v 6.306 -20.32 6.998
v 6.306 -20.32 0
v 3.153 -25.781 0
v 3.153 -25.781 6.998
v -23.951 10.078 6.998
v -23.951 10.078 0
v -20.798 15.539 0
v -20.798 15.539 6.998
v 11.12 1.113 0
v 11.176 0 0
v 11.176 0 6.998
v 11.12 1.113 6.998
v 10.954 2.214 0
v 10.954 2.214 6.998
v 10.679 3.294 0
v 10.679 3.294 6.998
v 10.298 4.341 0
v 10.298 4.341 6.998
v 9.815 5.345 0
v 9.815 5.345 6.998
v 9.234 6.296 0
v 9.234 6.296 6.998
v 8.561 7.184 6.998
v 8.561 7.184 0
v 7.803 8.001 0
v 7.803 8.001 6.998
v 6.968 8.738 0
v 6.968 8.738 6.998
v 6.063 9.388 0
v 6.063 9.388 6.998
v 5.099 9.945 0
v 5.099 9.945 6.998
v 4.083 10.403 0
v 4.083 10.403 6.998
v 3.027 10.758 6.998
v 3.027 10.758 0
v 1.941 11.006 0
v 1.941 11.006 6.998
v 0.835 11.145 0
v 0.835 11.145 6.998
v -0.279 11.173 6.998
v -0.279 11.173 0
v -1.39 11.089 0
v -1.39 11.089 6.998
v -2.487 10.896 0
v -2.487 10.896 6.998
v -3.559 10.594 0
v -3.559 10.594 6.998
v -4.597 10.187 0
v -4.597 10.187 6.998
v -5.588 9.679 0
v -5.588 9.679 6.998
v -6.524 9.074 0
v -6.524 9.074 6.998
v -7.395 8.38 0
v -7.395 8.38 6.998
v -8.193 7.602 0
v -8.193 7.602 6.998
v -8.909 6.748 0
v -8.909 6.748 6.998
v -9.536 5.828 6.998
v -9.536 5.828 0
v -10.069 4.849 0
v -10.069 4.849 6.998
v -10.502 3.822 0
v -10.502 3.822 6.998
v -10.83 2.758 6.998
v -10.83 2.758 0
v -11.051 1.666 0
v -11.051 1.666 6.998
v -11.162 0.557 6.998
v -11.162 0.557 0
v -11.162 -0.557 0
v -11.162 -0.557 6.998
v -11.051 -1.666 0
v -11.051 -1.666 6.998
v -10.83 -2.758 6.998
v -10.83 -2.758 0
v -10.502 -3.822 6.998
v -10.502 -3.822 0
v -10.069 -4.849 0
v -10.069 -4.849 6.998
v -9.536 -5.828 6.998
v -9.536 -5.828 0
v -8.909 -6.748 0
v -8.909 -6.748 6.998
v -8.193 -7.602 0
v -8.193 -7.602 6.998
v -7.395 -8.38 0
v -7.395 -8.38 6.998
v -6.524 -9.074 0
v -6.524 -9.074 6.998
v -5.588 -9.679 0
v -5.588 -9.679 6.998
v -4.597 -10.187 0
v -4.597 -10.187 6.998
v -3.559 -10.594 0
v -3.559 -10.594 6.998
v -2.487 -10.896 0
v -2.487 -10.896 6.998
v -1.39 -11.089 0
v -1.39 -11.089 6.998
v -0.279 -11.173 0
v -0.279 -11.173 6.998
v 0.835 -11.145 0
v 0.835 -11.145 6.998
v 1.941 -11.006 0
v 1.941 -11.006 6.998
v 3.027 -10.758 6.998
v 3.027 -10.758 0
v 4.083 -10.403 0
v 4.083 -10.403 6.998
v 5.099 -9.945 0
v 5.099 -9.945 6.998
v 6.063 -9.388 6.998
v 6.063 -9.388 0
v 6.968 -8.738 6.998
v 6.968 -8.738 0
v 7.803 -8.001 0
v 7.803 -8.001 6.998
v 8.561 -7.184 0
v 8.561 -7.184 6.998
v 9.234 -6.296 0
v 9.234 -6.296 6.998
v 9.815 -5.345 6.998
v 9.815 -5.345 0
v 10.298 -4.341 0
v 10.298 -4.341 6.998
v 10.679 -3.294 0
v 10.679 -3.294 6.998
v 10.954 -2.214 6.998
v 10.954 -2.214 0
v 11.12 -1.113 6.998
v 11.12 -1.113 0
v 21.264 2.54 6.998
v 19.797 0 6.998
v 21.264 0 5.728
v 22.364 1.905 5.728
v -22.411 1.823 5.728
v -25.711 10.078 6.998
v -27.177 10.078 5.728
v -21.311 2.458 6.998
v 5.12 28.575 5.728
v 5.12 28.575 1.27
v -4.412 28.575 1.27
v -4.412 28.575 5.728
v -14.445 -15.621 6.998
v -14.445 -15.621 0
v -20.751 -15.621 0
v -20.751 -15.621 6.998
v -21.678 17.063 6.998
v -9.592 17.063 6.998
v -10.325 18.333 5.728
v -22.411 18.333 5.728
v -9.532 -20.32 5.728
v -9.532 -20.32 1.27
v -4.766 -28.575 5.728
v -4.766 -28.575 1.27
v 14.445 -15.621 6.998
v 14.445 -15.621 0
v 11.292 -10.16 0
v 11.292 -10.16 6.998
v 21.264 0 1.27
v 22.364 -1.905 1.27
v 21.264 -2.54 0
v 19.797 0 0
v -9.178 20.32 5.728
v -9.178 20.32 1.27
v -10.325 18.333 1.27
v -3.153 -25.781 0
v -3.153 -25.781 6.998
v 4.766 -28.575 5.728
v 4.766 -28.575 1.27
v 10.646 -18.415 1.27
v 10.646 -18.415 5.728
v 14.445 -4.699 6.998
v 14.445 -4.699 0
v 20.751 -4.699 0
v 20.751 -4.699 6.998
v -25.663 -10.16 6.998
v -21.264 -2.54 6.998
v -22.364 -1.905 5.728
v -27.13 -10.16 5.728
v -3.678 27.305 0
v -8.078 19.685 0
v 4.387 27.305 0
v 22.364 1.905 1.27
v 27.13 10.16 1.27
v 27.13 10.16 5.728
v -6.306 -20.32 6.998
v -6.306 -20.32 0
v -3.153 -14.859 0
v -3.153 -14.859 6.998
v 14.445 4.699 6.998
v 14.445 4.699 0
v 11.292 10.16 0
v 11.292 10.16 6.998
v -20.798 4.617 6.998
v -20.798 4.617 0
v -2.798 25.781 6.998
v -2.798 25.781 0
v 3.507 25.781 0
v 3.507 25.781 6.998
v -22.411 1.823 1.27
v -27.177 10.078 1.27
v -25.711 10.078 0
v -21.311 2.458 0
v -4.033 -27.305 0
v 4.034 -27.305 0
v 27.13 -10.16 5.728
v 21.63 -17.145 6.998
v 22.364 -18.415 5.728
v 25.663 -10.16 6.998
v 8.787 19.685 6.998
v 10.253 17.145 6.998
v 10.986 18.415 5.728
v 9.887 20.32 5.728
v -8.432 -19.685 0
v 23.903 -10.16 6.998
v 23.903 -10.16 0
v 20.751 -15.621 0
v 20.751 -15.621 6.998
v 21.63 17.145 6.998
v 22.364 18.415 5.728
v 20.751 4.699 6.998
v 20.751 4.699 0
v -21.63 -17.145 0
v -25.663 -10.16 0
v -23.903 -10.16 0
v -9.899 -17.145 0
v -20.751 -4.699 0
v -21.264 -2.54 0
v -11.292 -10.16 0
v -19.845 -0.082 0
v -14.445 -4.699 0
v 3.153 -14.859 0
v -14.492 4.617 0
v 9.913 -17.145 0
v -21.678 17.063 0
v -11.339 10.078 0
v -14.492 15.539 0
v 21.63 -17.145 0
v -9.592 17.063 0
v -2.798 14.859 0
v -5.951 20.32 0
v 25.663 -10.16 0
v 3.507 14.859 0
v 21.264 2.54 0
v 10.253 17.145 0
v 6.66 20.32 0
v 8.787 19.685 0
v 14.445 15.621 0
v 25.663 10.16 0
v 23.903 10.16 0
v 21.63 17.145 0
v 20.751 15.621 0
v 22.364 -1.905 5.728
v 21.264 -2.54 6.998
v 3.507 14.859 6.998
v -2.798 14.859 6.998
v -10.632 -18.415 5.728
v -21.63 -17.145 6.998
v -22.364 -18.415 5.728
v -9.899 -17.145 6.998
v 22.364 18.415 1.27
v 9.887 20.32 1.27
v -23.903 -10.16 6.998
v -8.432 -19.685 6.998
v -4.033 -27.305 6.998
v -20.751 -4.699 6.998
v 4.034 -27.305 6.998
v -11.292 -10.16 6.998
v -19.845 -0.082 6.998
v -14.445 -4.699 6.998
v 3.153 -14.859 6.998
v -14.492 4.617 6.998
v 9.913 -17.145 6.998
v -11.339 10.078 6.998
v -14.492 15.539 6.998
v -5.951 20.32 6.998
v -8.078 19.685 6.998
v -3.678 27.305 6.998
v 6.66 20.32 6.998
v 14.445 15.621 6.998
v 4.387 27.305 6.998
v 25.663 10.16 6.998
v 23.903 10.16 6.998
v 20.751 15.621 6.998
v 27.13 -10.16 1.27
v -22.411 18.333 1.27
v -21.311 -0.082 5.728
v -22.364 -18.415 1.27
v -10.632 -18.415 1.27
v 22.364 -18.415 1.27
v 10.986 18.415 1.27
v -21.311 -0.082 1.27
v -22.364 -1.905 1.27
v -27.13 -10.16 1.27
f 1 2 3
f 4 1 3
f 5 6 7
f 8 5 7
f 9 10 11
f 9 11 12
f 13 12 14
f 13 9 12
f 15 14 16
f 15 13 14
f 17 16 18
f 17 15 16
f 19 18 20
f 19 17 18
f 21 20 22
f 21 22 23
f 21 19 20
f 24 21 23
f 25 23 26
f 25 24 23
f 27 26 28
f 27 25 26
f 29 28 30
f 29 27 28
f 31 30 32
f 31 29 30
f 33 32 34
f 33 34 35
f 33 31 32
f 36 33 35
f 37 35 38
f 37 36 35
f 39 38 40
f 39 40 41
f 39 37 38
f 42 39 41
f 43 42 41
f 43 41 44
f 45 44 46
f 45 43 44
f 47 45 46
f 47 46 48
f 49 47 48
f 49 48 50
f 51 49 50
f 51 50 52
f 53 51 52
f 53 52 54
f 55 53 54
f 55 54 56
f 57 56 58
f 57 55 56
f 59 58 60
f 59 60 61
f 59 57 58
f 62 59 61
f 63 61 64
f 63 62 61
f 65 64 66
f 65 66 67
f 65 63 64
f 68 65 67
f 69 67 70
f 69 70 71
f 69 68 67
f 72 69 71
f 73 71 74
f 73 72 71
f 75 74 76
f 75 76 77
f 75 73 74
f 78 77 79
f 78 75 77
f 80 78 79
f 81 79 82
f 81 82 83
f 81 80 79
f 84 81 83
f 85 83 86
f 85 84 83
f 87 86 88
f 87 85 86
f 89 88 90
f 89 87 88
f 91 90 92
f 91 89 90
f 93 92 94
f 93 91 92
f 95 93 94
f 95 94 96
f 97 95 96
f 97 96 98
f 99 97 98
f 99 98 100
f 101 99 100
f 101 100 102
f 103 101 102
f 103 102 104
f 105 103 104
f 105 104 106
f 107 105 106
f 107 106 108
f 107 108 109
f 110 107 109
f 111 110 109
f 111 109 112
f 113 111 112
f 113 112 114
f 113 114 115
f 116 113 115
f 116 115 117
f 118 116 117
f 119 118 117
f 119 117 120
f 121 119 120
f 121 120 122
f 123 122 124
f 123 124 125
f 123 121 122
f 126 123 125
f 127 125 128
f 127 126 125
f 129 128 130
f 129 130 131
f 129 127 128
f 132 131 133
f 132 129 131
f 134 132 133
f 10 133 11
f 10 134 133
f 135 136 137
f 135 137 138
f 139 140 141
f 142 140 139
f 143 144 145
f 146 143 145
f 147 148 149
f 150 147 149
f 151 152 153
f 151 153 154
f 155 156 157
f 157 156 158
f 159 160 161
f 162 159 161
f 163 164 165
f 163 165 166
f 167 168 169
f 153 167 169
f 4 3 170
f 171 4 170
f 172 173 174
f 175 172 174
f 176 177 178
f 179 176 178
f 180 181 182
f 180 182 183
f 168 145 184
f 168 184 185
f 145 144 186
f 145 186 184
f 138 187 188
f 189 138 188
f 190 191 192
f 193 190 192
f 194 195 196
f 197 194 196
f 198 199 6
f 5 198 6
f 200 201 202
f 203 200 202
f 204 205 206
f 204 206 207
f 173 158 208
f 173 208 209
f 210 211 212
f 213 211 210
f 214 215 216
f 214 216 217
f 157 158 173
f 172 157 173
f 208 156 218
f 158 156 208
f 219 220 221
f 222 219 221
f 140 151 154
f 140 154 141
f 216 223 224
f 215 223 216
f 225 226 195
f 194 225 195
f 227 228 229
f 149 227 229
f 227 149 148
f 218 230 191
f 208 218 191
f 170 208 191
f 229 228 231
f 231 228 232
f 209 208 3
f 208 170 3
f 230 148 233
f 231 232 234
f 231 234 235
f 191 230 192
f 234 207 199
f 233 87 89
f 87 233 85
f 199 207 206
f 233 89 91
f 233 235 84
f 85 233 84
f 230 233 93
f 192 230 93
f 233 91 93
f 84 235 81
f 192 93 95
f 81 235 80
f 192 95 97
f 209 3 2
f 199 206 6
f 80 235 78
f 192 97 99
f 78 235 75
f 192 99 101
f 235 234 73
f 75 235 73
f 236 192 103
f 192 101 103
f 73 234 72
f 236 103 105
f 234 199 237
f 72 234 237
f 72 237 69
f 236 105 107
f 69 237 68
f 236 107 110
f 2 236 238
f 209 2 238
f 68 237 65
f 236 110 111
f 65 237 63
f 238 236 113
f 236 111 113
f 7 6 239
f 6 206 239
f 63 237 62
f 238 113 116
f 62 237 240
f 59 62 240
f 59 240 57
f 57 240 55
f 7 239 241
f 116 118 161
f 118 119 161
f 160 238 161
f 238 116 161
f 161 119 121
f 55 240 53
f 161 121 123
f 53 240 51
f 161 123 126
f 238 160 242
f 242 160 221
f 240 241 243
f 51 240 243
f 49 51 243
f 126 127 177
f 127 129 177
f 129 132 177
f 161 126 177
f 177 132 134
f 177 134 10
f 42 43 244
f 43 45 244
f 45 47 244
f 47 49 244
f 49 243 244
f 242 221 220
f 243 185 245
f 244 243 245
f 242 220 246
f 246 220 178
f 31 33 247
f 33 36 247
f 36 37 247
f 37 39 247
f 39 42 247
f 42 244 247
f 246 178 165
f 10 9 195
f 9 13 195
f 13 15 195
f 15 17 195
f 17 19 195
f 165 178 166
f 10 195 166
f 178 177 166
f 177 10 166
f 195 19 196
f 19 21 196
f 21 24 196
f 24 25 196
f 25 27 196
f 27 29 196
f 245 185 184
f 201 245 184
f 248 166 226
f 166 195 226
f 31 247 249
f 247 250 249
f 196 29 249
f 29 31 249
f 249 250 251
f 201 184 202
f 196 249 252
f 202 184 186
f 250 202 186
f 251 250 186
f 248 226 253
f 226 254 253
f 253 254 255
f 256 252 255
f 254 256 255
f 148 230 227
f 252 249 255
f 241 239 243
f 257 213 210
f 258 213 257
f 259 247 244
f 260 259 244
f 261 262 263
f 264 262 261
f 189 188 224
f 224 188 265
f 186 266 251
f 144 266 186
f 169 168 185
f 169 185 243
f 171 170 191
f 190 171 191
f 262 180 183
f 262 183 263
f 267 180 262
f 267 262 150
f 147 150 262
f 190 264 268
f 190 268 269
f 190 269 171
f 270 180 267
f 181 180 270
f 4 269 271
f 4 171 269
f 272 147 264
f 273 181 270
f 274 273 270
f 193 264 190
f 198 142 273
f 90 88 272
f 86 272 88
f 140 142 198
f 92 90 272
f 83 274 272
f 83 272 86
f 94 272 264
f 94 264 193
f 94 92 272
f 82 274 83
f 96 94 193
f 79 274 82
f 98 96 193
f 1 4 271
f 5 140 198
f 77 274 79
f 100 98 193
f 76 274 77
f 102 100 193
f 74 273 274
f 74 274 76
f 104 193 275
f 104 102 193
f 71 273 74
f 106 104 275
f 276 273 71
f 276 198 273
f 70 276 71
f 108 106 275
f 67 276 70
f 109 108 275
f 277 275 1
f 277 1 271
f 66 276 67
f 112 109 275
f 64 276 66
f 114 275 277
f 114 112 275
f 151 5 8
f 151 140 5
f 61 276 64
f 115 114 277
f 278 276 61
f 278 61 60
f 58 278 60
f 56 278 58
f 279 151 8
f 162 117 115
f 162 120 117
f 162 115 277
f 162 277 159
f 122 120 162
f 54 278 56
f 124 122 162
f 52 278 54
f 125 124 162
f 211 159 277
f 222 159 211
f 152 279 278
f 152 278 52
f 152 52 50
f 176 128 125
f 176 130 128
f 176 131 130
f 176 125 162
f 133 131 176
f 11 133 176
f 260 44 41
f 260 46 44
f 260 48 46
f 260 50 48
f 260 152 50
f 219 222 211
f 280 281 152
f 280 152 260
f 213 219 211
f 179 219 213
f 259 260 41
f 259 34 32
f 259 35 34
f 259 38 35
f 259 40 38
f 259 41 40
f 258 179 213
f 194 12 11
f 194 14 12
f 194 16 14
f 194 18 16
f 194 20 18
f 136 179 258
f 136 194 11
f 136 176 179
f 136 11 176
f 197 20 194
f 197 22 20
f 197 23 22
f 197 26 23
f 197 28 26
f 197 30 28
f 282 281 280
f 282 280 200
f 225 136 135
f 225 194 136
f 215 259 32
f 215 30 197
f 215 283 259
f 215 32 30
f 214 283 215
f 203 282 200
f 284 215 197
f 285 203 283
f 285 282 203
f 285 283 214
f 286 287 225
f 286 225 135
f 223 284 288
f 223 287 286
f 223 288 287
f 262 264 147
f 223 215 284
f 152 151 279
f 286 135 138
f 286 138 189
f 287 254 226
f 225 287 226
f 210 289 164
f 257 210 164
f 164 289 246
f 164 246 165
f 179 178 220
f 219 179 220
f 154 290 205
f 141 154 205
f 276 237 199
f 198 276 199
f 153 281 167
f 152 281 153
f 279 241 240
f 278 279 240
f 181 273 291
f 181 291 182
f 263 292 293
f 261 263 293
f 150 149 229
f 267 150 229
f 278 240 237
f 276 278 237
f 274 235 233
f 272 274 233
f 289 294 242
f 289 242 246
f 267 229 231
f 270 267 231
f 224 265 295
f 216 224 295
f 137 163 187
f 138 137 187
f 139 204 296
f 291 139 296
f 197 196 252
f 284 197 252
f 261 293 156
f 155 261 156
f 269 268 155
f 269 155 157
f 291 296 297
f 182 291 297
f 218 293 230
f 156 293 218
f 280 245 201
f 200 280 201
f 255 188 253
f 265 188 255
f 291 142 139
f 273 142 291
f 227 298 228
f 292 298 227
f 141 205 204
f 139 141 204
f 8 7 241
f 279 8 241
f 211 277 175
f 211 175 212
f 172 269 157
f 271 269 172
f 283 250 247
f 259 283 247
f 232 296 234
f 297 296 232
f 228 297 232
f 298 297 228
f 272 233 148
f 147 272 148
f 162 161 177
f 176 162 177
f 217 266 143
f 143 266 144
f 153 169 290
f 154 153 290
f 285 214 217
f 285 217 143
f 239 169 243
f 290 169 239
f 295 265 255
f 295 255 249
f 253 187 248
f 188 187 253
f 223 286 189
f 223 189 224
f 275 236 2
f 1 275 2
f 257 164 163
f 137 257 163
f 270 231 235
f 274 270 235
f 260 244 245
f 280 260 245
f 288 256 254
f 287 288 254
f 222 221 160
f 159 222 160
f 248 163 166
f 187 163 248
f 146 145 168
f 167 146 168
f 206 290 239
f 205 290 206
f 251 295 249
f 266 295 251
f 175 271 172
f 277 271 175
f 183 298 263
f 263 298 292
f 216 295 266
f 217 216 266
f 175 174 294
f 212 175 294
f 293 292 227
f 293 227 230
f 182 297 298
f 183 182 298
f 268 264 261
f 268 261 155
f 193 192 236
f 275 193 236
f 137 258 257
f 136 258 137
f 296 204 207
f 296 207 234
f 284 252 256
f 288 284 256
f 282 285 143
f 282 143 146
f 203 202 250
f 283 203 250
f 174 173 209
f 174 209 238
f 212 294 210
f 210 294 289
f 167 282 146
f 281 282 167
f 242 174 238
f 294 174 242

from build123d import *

# Parameters (mm, degrees)
F1_DEPTH = 6.9977
F2_R     = 11.176
F3_DEPTH = 6.9977
F4_SIZE  = 1.27


# Not quite as in the source:
# - a feature names something its author has since deleted; it is built from what else it names


with BuildPart() as f1:
    # F0 (on Top) → F1 (new body)
    with BuildSketch(Plane.XY):
        Polygon((-1.27, 12.7), (1.27, 12.7), (5.4871048633, 12.7), (6.9125849394, 15.169003917), (7.0907659214, 15.4776224307), (9.8865139145, 20.32), (5.1204874424, 28.575), (-4.411565502, 28.575), (-9.1775919741, 20.32), (-4.7781829229, 12.7), align=None)
        Polygon((6.6602806103, 20.32), (3.5073707902, 14.859), (-2.7984488498, 14.859), (-5.9513586699, 20.32), (-2.7984488498, 25.781), (3.5073707902, 25.781), align=None, mode=Mode.SUBTRACT)
        Polygon((6.9125849394, 15.169003917), (5.4871048633, 12.7), (7.3323484187, 12.7), (8.4322006815, 10.795), (12.8316097327, 18.415), (10.9863661773, 18.415), (9.8865139145, 20.32), (7.0907659214, 15.4776224307), align=None)
        Polygon((-7.3323484187, 12.7), (-4.7781829229, 12.7), (-9.1775919741, 20.32), (-10.3250266623, 18.3325848218), (-12.8789355329, 18.3325848218), (-8.4796547943, 10.7128070657), align=None)
        Polygon((12.8316097327, 18.415), (8.4322006815, 10.795), (11.6335226281, 5.2501477372), (13.5648445746, 1.905), (16.3276362049, 1.905), (18.8676362049, 1.905), (22.3636626771, 1.905), (27.1296891492, 10.16), (22.3636626771, 18.415), align=None)
        Polygon((20.7505460249, 4.699), (14.4447263849, 4.699), (11.2918165648, 10.16), (14.4447263849, 15.621), (20.7505460249, 15.621), (23.903455845, 10.16), align=None, mode=Mode.SUBTRACT)
        Polygon((-9.8614826635, 8.3194109889), (-8.4796547943, 10.7128070657), (-12.8789355329, 18.3325848218), (-22.4109884772, 18.3325848218), (-27.1770149494, 10.0775848218), (-22.4109884772, 1.8225848218), (-13.612427, 1.8225848218), (-11.1783483187, 6.0385327673), align=None)
        Polygon((-14.492052185, 15.5385848218), (-11.339142365, 10.0775848218), (-14.492052185, 4.6165848218), (-20.7978718251, 4.6165848218), (-23.9507816452, 10.0775848218), (-20.7978718251, 15.5385848218), align=None, mode=Mode.SUBTRACT)
        Polygon((16.3276362049, 1.905), (13.5648445746, 1.905), (14.6646968374, 0), (13.5648445746, -1.905), (22.3636626771, -1.905), (21.2638104143, 0), (22.3636626771, 1.905), (18.8676362049, 1.905), align=None)
        Polygon((-14.6646968374, 0), (-13.612427, 1.8225848218), (-22.4109884772, 1.8225848218), (-21.311264527, -0.0821929343), (-22.3636626771, -1.905), (-19.9342235854, -1.905), (-17.3764717744, -1.905), (-13.5648445746, -1.905), align=None)
        Polygon((22.3636626771, -1.905), (13.5648445746, -1.905), (10.3635226281, -7.4498522628), (8.4322006815, -10.795), (9.8135964967, -13.1876477372), (11.0835964967, -15.3873522628), (12.8316097327, -18.415), (22.3636626771, -18.415), (27.1296891492, -10.16), align=None)
        Polygon((14.4447263849, -15.621), (11.2918165648, -10.16), (14.4447263849, -4.699), (20.7505460249, -4.699), (23.903455845, -10.16), (20.7505460249, -15.621), align=None, mode=Mode.SUBTRACT)
        Polygon((-11.6335226281, -5.2501477372), (-13.5648445746, -1.905), (-17.3764717744, -1.905), (-19.9342235854, -1.905), (-22.3636626771, -1.905), (-27.1296891492, -10.16), (-22.3636626771, -18.415), (-12.8316097327, -18.415), (-8.4322006815, -10.795), (-10.3635226281, -7.4498522628), align=None)
        Polygon((-20.7505460249, -4.699), (-14.4447263849, -4.699), (-11.2918165648, -10.16), (-14.4447263849, -15.621), (-20.7505460249, -15.621), (-23.903455845, -10.16), align=None, mode=Mode.SUBTRACT)
        Polygon((9.8135964967, -13.1876477372), (8.4322006815, -10.795), (7.3323484187, -12.7), (5.1326438931, -12.7), (9.5320529443, -20.32), (4.7660264722, -28.575), (10.6457036946, -18.415), (12.8316097327, -18.415), (11.0835964967, -15.3873522628), align=None)
        Polygon((9.5320529443, -20.32), (5.1326438931, -12.7), (1.27, -12.7), (-1.27, -12.7), (-5.1326438931, -12.7), (-6.5140397082, -15.0926477372), (-7.7840397082, -17.2923522628), (-9.5320529443, -20.32), (-4.7660264722, -28.575), (4.7660264722, -28.575), align=None)
        Polygon((-6.3058196401, -20.32), (-3.15290982, -14.859), (3.15290982, -14.859), (6.3058196401, -20.32), (3.15290982, -25.781), (-3.15290982, -25.781), align=None, mode=Mode.SUBTRACT)
        Polygon((-7.3323484187, -12.7), (-8.4322006815, -10.795), (-12.8316097327, -18.415), (-10.6319052071, -18.415), (-9.5320529443, -20.32), (-7.7840397082, -17.2923522628), (-6.5140397082, -15.0926477372), (-5.1326438931, -12.7), align=None)
        Polygon((5.4871048633, 12.7), (1.27, 12.7), (-1.27, 12.7), (-4.7781829229, 12.7), (-4.411565502, 12.065), (-2.0086818804, 12.065), (1.267424375, 12.065), (5.1204874424, 12.065), align=None)
        Polygon((-12.8316097327, -1.905), (-13.5648445746, -1.905), (-11.6335226281, -5.2501477372), (-11.0835964967, -4.9326477372), align=None)
        Polygon((1.27, -12.7), (5.1326438931, -12.7), (4.7660264722, -12.065), (1.27, -12.065), (-1.27, -12.065), (-4.7660264722, -12.065), (-5.1326438931, -12.7), (-1.27, -12.7), align=None)
        Polygon((9.8135964967, -7.1323522628), (10.3635226281, -7.4498522628), (11.5783918417, -5.2183179628), (11.0835964967, -4.9326477372), align=None)
        Polygon((11.0835964967, 4.9326477372), (11.6335226281, 5.2501477372), (10.3083918417, 7.4180224884), (9.8135964967, 7.1323522628), align=None)
        Polygon((-9.3113640632, 8.0017998669), (-9.8614826635, 8.3194109889), (-11.1783483187, 6.0385327673), (-10.6282297184, 5.7209216453), align=None)
        Polygon((11.6335226281, 5.2501477372), (8.4322006815, 10.795), (8.0655832606, 10.16), (9.8135964967, 7.1323522628), (10.3083918417, 7.4180224884), align=None)
        Polygon((10.3635226281, -7.4498522628), (13.5648445746, -1.905), (12.8316097327, -1.905), (11.0835964967, -4.9326477372), (11.5783918417, -5.2183179628), align=None)
    extrude(amount=F1_DEPTH)

    # F2 (on Top) → F3 (join)
    with BuildSketch(Plane.XY):
        Polygon((7.6989658396, 13.335), (-7.6989658396, 13.335), (-15.3979316793, 0), (-7.6989658396, -13.335), (7.6989658396, -13.335), (15.3979316793, 0), align=None)
        Circle(F2_R, mode=Mode.SUBTRACT)
    extrude(amount=F3_DEPTH)

    # F4
    f4_edges = [f1.edges().sort_by_distance(p)[0] for p in [
        (-16.497784, -18.415, 6.9977),
        (-16.497784, -18.415, 0),
        (-7.698966, -23.495, 6.9977),
        (-7.698966, -23.495, 0),
        (0, -28.575, 6.9977),
        (0, -28.575, 0),
        (7.705865, -23.495, 0),
        (7.705865, -23.495, 6.9977),
        (16.504683, -18.415, 0),
        (16.504683, -18.415, 6.9977),
        (24.746676, -14.2875, 6.9977),
        (24.746676, -14.2875, 0),
        (24.19675, 5.08, 0),
        (24.19675, 5.08, 6.9977),
        (24.746676, 14.2875, 6.9977),
        (24.746676, 14.2875, 0),
        (16.675014, 18.415, 0),
        (16.675014, 18.415, 6.9977),
        (8.053427, 23.495, 0),
        (8.053427, 23.495, 6.9977),
        (0.354461, 28.575, 0),
        (0.354461, 28.575, 6.9977),
        (-7.368296, 23.453792, 6.9977),
        (-7.368296, 23.453792, 0),
        (-16.368008, 18.332585, 0),
        (-16.368008, 18.332585, 6.9977),
        (-24.794002, 14.205085, 0),
        (-24.794002, 14.205085, 6.9977),
        (-24.24414, 4.997696, 6.9977),
        (-24.24414, 4.997696, 0),
        (-24.220477, -5.121096, 0),
        (-24.220477, -5.121096, 6.9977),
        (-24.746676, -14.2875, 6.9977),
        (-24.746676, -14.2875, 0),
        (24.19675, -5.08, 0),
        (24.19675, -5.08, 6.9977),
    ]]
    chamfer(f4_edges, length=F4_SIZE)


solid = f1.part
